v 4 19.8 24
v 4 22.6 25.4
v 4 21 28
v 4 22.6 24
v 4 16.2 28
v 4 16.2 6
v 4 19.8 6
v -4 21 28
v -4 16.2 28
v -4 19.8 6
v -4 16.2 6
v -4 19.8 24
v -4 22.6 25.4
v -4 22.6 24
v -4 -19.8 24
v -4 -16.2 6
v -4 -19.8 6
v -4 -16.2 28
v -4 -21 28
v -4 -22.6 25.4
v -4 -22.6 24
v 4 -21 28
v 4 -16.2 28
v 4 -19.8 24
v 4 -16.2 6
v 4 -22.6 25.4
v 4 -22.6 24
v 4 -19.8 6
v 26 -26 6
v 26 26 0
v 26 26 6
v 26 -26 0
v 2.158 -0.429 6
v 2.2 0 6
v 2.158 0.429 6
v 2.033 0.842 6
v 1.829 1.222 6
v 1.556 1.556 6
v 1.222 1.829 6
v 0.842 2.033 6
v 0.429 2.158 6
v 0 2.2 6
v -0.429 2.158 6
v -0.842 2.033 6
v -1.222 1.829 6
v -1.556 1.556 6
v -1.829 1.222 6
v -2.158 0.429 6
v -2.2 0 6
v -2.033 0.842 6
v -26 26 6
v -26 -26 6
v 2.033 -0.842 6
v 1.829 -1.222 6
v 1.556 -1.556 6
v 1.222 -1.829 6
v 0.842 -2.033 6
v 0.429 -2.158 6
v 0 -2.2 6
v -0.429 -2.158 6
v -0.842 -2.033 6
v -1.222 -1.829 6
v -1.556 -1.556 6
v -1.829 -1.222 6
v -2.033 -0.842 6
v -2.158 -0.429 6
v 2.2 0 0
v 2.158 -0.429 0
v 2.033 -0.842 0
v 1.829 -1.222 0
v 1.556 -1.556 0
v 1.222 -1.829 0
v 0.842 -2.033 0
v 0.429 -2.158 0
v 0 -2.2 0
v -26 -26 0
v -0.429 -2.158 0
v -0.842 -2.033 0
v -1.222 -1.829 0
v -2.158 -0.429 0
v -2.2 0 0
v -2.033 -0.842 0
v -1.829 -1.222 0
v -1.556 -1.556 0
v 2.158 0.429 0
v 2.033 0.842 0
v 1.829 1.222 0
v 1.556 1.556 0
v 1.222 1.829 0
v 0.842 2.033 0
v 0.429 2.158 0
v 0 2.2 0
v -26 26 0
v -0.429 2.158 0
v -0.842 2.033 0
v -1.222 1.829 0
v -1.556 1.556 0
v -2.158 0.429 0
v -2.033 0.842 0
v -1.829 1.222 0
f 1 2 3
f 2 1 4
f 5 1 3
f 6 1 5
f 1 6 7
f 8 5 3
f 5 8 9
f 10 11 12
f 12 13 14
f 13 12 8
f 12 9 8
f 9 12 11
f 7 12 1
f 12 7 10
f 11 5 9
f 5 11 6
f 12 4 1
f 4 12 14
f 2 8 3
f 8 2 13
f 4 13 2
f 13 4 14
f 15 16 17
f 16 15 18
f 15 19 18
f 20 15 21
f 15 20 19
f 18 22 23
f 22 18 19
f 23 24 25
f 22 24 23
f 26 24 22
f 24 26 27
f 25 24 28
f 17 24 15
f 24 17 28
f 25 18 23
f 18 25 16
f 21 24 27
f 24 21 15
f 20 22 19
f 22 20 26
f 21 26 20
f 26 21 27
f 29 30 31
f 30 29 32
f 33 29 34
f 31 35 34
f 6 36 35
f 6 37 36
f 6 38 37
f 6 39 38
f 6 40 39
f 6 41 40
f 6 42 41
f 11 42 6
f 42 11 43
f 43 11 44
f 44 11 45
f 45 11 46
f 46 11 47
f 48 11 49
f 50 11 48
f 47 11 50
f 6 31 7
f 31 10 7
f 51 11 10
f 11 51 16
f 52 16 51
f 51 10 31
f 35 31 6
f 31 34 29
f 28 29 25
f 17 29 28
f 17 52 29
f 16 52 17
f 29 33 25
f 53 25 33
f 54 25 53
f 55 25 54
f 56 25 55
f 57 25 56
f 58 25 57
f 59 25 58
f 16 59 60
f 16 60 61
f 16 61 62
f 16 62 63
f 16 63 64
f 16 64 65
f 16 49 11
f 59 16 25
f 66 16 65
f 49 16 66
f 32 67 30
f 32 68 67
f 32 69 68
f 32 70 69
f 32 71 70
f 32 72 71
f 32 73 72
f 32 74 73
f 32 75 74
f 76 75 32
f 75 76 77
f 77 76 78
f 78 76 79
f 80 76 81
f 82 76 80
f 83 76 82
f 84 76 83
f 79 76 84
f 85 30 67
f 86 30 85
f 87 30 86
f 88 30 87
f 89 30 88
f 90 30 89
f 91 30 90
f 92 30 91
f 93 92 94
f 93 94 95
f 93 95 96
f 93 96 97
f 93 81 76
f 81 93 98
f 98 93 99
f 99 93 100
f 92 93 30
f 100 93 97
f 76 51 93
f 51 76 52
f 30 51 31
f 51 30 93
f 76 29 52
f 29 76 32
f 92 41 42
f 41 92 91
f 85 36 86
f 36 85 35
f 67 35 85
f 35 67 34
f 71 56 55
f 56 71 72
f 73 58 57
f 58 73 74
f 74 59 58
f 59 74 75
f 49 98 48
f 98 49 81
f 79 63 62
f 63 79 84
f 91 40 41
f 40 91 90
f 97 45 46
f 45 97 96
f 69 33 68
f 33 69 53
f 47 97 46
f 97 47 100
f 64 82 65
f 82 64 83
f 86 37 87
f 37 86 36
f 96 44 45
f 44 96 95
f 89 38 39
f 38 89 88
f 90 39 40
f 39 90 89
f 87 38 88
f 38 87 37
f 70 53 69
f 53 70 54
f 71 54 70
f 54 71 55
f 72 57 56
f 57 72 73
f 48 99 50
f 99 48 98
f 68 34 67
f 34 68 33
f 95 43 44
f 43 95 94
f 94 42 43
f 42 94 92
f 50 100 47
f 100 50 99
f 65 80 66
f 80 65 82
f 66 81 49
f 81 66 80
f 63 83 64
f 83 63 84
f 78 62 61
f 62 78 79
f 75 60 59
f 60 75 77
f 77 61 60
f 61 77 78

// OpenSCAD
$fn = 32;

// ----------------------------------------------------------------------
// Snap-fit latch: 2 arms, 22 mm tall, 3 mm undercut hooks
// ----------------------------------------------------------------------

// --- parameters (mm) ---
base_d = 52;              // base plate depth
base_h = 6;               // base plate thickness
span = 36;                // distance between opposite arms
arm_t = 3.6;              // arm thickness
arm_d = 8;                // arm width
height = 22;              // free arm length
head_len = 3;             // hook reach
head_h = 4;               // hook height
lead = 1.4;               // lead-in ramp thickness
bore_d = 4.4;             // base fixing bore
top_z = 28;               // height of the arm tips above the base

arms = 2;

difference() {
  union() {
    /* base plate, centred on the arm ring */
    translate([-26, -26, 0]) cube([base_d, base_d, base_h]);
    for (a = [0 : 360 / arms : 359]) rotate([0, 0, a]) {
    /* arm, sunk 0.5 mm into the base */
    translate([-arm_d / 2, span / 2 - arm_t / 2, base_h - 0.5]) cube([arm_d, arm_t, height + 0.5]);
    /* hook: a convex hull of a tall inner block and a thin outer lip
       gives a flat undercut below and a lead-in ramp on top */
    hull() {
      translate([-arm_d / 2, span / 2 + arm_t / 2 - 0.6, top_z - head_h]) cube([arm_d, lead + 0.4, head_h]);
      translate([-arm_d / 2, span / 2 + arm_t / 2 - 0.2, top_z - head_h]) cube([arm_d, head_len, lead]);
    }
    }
  }
  translate([0, 0, -2.5]) cylinder(h = base_h + 5, d = bore_d);
}
